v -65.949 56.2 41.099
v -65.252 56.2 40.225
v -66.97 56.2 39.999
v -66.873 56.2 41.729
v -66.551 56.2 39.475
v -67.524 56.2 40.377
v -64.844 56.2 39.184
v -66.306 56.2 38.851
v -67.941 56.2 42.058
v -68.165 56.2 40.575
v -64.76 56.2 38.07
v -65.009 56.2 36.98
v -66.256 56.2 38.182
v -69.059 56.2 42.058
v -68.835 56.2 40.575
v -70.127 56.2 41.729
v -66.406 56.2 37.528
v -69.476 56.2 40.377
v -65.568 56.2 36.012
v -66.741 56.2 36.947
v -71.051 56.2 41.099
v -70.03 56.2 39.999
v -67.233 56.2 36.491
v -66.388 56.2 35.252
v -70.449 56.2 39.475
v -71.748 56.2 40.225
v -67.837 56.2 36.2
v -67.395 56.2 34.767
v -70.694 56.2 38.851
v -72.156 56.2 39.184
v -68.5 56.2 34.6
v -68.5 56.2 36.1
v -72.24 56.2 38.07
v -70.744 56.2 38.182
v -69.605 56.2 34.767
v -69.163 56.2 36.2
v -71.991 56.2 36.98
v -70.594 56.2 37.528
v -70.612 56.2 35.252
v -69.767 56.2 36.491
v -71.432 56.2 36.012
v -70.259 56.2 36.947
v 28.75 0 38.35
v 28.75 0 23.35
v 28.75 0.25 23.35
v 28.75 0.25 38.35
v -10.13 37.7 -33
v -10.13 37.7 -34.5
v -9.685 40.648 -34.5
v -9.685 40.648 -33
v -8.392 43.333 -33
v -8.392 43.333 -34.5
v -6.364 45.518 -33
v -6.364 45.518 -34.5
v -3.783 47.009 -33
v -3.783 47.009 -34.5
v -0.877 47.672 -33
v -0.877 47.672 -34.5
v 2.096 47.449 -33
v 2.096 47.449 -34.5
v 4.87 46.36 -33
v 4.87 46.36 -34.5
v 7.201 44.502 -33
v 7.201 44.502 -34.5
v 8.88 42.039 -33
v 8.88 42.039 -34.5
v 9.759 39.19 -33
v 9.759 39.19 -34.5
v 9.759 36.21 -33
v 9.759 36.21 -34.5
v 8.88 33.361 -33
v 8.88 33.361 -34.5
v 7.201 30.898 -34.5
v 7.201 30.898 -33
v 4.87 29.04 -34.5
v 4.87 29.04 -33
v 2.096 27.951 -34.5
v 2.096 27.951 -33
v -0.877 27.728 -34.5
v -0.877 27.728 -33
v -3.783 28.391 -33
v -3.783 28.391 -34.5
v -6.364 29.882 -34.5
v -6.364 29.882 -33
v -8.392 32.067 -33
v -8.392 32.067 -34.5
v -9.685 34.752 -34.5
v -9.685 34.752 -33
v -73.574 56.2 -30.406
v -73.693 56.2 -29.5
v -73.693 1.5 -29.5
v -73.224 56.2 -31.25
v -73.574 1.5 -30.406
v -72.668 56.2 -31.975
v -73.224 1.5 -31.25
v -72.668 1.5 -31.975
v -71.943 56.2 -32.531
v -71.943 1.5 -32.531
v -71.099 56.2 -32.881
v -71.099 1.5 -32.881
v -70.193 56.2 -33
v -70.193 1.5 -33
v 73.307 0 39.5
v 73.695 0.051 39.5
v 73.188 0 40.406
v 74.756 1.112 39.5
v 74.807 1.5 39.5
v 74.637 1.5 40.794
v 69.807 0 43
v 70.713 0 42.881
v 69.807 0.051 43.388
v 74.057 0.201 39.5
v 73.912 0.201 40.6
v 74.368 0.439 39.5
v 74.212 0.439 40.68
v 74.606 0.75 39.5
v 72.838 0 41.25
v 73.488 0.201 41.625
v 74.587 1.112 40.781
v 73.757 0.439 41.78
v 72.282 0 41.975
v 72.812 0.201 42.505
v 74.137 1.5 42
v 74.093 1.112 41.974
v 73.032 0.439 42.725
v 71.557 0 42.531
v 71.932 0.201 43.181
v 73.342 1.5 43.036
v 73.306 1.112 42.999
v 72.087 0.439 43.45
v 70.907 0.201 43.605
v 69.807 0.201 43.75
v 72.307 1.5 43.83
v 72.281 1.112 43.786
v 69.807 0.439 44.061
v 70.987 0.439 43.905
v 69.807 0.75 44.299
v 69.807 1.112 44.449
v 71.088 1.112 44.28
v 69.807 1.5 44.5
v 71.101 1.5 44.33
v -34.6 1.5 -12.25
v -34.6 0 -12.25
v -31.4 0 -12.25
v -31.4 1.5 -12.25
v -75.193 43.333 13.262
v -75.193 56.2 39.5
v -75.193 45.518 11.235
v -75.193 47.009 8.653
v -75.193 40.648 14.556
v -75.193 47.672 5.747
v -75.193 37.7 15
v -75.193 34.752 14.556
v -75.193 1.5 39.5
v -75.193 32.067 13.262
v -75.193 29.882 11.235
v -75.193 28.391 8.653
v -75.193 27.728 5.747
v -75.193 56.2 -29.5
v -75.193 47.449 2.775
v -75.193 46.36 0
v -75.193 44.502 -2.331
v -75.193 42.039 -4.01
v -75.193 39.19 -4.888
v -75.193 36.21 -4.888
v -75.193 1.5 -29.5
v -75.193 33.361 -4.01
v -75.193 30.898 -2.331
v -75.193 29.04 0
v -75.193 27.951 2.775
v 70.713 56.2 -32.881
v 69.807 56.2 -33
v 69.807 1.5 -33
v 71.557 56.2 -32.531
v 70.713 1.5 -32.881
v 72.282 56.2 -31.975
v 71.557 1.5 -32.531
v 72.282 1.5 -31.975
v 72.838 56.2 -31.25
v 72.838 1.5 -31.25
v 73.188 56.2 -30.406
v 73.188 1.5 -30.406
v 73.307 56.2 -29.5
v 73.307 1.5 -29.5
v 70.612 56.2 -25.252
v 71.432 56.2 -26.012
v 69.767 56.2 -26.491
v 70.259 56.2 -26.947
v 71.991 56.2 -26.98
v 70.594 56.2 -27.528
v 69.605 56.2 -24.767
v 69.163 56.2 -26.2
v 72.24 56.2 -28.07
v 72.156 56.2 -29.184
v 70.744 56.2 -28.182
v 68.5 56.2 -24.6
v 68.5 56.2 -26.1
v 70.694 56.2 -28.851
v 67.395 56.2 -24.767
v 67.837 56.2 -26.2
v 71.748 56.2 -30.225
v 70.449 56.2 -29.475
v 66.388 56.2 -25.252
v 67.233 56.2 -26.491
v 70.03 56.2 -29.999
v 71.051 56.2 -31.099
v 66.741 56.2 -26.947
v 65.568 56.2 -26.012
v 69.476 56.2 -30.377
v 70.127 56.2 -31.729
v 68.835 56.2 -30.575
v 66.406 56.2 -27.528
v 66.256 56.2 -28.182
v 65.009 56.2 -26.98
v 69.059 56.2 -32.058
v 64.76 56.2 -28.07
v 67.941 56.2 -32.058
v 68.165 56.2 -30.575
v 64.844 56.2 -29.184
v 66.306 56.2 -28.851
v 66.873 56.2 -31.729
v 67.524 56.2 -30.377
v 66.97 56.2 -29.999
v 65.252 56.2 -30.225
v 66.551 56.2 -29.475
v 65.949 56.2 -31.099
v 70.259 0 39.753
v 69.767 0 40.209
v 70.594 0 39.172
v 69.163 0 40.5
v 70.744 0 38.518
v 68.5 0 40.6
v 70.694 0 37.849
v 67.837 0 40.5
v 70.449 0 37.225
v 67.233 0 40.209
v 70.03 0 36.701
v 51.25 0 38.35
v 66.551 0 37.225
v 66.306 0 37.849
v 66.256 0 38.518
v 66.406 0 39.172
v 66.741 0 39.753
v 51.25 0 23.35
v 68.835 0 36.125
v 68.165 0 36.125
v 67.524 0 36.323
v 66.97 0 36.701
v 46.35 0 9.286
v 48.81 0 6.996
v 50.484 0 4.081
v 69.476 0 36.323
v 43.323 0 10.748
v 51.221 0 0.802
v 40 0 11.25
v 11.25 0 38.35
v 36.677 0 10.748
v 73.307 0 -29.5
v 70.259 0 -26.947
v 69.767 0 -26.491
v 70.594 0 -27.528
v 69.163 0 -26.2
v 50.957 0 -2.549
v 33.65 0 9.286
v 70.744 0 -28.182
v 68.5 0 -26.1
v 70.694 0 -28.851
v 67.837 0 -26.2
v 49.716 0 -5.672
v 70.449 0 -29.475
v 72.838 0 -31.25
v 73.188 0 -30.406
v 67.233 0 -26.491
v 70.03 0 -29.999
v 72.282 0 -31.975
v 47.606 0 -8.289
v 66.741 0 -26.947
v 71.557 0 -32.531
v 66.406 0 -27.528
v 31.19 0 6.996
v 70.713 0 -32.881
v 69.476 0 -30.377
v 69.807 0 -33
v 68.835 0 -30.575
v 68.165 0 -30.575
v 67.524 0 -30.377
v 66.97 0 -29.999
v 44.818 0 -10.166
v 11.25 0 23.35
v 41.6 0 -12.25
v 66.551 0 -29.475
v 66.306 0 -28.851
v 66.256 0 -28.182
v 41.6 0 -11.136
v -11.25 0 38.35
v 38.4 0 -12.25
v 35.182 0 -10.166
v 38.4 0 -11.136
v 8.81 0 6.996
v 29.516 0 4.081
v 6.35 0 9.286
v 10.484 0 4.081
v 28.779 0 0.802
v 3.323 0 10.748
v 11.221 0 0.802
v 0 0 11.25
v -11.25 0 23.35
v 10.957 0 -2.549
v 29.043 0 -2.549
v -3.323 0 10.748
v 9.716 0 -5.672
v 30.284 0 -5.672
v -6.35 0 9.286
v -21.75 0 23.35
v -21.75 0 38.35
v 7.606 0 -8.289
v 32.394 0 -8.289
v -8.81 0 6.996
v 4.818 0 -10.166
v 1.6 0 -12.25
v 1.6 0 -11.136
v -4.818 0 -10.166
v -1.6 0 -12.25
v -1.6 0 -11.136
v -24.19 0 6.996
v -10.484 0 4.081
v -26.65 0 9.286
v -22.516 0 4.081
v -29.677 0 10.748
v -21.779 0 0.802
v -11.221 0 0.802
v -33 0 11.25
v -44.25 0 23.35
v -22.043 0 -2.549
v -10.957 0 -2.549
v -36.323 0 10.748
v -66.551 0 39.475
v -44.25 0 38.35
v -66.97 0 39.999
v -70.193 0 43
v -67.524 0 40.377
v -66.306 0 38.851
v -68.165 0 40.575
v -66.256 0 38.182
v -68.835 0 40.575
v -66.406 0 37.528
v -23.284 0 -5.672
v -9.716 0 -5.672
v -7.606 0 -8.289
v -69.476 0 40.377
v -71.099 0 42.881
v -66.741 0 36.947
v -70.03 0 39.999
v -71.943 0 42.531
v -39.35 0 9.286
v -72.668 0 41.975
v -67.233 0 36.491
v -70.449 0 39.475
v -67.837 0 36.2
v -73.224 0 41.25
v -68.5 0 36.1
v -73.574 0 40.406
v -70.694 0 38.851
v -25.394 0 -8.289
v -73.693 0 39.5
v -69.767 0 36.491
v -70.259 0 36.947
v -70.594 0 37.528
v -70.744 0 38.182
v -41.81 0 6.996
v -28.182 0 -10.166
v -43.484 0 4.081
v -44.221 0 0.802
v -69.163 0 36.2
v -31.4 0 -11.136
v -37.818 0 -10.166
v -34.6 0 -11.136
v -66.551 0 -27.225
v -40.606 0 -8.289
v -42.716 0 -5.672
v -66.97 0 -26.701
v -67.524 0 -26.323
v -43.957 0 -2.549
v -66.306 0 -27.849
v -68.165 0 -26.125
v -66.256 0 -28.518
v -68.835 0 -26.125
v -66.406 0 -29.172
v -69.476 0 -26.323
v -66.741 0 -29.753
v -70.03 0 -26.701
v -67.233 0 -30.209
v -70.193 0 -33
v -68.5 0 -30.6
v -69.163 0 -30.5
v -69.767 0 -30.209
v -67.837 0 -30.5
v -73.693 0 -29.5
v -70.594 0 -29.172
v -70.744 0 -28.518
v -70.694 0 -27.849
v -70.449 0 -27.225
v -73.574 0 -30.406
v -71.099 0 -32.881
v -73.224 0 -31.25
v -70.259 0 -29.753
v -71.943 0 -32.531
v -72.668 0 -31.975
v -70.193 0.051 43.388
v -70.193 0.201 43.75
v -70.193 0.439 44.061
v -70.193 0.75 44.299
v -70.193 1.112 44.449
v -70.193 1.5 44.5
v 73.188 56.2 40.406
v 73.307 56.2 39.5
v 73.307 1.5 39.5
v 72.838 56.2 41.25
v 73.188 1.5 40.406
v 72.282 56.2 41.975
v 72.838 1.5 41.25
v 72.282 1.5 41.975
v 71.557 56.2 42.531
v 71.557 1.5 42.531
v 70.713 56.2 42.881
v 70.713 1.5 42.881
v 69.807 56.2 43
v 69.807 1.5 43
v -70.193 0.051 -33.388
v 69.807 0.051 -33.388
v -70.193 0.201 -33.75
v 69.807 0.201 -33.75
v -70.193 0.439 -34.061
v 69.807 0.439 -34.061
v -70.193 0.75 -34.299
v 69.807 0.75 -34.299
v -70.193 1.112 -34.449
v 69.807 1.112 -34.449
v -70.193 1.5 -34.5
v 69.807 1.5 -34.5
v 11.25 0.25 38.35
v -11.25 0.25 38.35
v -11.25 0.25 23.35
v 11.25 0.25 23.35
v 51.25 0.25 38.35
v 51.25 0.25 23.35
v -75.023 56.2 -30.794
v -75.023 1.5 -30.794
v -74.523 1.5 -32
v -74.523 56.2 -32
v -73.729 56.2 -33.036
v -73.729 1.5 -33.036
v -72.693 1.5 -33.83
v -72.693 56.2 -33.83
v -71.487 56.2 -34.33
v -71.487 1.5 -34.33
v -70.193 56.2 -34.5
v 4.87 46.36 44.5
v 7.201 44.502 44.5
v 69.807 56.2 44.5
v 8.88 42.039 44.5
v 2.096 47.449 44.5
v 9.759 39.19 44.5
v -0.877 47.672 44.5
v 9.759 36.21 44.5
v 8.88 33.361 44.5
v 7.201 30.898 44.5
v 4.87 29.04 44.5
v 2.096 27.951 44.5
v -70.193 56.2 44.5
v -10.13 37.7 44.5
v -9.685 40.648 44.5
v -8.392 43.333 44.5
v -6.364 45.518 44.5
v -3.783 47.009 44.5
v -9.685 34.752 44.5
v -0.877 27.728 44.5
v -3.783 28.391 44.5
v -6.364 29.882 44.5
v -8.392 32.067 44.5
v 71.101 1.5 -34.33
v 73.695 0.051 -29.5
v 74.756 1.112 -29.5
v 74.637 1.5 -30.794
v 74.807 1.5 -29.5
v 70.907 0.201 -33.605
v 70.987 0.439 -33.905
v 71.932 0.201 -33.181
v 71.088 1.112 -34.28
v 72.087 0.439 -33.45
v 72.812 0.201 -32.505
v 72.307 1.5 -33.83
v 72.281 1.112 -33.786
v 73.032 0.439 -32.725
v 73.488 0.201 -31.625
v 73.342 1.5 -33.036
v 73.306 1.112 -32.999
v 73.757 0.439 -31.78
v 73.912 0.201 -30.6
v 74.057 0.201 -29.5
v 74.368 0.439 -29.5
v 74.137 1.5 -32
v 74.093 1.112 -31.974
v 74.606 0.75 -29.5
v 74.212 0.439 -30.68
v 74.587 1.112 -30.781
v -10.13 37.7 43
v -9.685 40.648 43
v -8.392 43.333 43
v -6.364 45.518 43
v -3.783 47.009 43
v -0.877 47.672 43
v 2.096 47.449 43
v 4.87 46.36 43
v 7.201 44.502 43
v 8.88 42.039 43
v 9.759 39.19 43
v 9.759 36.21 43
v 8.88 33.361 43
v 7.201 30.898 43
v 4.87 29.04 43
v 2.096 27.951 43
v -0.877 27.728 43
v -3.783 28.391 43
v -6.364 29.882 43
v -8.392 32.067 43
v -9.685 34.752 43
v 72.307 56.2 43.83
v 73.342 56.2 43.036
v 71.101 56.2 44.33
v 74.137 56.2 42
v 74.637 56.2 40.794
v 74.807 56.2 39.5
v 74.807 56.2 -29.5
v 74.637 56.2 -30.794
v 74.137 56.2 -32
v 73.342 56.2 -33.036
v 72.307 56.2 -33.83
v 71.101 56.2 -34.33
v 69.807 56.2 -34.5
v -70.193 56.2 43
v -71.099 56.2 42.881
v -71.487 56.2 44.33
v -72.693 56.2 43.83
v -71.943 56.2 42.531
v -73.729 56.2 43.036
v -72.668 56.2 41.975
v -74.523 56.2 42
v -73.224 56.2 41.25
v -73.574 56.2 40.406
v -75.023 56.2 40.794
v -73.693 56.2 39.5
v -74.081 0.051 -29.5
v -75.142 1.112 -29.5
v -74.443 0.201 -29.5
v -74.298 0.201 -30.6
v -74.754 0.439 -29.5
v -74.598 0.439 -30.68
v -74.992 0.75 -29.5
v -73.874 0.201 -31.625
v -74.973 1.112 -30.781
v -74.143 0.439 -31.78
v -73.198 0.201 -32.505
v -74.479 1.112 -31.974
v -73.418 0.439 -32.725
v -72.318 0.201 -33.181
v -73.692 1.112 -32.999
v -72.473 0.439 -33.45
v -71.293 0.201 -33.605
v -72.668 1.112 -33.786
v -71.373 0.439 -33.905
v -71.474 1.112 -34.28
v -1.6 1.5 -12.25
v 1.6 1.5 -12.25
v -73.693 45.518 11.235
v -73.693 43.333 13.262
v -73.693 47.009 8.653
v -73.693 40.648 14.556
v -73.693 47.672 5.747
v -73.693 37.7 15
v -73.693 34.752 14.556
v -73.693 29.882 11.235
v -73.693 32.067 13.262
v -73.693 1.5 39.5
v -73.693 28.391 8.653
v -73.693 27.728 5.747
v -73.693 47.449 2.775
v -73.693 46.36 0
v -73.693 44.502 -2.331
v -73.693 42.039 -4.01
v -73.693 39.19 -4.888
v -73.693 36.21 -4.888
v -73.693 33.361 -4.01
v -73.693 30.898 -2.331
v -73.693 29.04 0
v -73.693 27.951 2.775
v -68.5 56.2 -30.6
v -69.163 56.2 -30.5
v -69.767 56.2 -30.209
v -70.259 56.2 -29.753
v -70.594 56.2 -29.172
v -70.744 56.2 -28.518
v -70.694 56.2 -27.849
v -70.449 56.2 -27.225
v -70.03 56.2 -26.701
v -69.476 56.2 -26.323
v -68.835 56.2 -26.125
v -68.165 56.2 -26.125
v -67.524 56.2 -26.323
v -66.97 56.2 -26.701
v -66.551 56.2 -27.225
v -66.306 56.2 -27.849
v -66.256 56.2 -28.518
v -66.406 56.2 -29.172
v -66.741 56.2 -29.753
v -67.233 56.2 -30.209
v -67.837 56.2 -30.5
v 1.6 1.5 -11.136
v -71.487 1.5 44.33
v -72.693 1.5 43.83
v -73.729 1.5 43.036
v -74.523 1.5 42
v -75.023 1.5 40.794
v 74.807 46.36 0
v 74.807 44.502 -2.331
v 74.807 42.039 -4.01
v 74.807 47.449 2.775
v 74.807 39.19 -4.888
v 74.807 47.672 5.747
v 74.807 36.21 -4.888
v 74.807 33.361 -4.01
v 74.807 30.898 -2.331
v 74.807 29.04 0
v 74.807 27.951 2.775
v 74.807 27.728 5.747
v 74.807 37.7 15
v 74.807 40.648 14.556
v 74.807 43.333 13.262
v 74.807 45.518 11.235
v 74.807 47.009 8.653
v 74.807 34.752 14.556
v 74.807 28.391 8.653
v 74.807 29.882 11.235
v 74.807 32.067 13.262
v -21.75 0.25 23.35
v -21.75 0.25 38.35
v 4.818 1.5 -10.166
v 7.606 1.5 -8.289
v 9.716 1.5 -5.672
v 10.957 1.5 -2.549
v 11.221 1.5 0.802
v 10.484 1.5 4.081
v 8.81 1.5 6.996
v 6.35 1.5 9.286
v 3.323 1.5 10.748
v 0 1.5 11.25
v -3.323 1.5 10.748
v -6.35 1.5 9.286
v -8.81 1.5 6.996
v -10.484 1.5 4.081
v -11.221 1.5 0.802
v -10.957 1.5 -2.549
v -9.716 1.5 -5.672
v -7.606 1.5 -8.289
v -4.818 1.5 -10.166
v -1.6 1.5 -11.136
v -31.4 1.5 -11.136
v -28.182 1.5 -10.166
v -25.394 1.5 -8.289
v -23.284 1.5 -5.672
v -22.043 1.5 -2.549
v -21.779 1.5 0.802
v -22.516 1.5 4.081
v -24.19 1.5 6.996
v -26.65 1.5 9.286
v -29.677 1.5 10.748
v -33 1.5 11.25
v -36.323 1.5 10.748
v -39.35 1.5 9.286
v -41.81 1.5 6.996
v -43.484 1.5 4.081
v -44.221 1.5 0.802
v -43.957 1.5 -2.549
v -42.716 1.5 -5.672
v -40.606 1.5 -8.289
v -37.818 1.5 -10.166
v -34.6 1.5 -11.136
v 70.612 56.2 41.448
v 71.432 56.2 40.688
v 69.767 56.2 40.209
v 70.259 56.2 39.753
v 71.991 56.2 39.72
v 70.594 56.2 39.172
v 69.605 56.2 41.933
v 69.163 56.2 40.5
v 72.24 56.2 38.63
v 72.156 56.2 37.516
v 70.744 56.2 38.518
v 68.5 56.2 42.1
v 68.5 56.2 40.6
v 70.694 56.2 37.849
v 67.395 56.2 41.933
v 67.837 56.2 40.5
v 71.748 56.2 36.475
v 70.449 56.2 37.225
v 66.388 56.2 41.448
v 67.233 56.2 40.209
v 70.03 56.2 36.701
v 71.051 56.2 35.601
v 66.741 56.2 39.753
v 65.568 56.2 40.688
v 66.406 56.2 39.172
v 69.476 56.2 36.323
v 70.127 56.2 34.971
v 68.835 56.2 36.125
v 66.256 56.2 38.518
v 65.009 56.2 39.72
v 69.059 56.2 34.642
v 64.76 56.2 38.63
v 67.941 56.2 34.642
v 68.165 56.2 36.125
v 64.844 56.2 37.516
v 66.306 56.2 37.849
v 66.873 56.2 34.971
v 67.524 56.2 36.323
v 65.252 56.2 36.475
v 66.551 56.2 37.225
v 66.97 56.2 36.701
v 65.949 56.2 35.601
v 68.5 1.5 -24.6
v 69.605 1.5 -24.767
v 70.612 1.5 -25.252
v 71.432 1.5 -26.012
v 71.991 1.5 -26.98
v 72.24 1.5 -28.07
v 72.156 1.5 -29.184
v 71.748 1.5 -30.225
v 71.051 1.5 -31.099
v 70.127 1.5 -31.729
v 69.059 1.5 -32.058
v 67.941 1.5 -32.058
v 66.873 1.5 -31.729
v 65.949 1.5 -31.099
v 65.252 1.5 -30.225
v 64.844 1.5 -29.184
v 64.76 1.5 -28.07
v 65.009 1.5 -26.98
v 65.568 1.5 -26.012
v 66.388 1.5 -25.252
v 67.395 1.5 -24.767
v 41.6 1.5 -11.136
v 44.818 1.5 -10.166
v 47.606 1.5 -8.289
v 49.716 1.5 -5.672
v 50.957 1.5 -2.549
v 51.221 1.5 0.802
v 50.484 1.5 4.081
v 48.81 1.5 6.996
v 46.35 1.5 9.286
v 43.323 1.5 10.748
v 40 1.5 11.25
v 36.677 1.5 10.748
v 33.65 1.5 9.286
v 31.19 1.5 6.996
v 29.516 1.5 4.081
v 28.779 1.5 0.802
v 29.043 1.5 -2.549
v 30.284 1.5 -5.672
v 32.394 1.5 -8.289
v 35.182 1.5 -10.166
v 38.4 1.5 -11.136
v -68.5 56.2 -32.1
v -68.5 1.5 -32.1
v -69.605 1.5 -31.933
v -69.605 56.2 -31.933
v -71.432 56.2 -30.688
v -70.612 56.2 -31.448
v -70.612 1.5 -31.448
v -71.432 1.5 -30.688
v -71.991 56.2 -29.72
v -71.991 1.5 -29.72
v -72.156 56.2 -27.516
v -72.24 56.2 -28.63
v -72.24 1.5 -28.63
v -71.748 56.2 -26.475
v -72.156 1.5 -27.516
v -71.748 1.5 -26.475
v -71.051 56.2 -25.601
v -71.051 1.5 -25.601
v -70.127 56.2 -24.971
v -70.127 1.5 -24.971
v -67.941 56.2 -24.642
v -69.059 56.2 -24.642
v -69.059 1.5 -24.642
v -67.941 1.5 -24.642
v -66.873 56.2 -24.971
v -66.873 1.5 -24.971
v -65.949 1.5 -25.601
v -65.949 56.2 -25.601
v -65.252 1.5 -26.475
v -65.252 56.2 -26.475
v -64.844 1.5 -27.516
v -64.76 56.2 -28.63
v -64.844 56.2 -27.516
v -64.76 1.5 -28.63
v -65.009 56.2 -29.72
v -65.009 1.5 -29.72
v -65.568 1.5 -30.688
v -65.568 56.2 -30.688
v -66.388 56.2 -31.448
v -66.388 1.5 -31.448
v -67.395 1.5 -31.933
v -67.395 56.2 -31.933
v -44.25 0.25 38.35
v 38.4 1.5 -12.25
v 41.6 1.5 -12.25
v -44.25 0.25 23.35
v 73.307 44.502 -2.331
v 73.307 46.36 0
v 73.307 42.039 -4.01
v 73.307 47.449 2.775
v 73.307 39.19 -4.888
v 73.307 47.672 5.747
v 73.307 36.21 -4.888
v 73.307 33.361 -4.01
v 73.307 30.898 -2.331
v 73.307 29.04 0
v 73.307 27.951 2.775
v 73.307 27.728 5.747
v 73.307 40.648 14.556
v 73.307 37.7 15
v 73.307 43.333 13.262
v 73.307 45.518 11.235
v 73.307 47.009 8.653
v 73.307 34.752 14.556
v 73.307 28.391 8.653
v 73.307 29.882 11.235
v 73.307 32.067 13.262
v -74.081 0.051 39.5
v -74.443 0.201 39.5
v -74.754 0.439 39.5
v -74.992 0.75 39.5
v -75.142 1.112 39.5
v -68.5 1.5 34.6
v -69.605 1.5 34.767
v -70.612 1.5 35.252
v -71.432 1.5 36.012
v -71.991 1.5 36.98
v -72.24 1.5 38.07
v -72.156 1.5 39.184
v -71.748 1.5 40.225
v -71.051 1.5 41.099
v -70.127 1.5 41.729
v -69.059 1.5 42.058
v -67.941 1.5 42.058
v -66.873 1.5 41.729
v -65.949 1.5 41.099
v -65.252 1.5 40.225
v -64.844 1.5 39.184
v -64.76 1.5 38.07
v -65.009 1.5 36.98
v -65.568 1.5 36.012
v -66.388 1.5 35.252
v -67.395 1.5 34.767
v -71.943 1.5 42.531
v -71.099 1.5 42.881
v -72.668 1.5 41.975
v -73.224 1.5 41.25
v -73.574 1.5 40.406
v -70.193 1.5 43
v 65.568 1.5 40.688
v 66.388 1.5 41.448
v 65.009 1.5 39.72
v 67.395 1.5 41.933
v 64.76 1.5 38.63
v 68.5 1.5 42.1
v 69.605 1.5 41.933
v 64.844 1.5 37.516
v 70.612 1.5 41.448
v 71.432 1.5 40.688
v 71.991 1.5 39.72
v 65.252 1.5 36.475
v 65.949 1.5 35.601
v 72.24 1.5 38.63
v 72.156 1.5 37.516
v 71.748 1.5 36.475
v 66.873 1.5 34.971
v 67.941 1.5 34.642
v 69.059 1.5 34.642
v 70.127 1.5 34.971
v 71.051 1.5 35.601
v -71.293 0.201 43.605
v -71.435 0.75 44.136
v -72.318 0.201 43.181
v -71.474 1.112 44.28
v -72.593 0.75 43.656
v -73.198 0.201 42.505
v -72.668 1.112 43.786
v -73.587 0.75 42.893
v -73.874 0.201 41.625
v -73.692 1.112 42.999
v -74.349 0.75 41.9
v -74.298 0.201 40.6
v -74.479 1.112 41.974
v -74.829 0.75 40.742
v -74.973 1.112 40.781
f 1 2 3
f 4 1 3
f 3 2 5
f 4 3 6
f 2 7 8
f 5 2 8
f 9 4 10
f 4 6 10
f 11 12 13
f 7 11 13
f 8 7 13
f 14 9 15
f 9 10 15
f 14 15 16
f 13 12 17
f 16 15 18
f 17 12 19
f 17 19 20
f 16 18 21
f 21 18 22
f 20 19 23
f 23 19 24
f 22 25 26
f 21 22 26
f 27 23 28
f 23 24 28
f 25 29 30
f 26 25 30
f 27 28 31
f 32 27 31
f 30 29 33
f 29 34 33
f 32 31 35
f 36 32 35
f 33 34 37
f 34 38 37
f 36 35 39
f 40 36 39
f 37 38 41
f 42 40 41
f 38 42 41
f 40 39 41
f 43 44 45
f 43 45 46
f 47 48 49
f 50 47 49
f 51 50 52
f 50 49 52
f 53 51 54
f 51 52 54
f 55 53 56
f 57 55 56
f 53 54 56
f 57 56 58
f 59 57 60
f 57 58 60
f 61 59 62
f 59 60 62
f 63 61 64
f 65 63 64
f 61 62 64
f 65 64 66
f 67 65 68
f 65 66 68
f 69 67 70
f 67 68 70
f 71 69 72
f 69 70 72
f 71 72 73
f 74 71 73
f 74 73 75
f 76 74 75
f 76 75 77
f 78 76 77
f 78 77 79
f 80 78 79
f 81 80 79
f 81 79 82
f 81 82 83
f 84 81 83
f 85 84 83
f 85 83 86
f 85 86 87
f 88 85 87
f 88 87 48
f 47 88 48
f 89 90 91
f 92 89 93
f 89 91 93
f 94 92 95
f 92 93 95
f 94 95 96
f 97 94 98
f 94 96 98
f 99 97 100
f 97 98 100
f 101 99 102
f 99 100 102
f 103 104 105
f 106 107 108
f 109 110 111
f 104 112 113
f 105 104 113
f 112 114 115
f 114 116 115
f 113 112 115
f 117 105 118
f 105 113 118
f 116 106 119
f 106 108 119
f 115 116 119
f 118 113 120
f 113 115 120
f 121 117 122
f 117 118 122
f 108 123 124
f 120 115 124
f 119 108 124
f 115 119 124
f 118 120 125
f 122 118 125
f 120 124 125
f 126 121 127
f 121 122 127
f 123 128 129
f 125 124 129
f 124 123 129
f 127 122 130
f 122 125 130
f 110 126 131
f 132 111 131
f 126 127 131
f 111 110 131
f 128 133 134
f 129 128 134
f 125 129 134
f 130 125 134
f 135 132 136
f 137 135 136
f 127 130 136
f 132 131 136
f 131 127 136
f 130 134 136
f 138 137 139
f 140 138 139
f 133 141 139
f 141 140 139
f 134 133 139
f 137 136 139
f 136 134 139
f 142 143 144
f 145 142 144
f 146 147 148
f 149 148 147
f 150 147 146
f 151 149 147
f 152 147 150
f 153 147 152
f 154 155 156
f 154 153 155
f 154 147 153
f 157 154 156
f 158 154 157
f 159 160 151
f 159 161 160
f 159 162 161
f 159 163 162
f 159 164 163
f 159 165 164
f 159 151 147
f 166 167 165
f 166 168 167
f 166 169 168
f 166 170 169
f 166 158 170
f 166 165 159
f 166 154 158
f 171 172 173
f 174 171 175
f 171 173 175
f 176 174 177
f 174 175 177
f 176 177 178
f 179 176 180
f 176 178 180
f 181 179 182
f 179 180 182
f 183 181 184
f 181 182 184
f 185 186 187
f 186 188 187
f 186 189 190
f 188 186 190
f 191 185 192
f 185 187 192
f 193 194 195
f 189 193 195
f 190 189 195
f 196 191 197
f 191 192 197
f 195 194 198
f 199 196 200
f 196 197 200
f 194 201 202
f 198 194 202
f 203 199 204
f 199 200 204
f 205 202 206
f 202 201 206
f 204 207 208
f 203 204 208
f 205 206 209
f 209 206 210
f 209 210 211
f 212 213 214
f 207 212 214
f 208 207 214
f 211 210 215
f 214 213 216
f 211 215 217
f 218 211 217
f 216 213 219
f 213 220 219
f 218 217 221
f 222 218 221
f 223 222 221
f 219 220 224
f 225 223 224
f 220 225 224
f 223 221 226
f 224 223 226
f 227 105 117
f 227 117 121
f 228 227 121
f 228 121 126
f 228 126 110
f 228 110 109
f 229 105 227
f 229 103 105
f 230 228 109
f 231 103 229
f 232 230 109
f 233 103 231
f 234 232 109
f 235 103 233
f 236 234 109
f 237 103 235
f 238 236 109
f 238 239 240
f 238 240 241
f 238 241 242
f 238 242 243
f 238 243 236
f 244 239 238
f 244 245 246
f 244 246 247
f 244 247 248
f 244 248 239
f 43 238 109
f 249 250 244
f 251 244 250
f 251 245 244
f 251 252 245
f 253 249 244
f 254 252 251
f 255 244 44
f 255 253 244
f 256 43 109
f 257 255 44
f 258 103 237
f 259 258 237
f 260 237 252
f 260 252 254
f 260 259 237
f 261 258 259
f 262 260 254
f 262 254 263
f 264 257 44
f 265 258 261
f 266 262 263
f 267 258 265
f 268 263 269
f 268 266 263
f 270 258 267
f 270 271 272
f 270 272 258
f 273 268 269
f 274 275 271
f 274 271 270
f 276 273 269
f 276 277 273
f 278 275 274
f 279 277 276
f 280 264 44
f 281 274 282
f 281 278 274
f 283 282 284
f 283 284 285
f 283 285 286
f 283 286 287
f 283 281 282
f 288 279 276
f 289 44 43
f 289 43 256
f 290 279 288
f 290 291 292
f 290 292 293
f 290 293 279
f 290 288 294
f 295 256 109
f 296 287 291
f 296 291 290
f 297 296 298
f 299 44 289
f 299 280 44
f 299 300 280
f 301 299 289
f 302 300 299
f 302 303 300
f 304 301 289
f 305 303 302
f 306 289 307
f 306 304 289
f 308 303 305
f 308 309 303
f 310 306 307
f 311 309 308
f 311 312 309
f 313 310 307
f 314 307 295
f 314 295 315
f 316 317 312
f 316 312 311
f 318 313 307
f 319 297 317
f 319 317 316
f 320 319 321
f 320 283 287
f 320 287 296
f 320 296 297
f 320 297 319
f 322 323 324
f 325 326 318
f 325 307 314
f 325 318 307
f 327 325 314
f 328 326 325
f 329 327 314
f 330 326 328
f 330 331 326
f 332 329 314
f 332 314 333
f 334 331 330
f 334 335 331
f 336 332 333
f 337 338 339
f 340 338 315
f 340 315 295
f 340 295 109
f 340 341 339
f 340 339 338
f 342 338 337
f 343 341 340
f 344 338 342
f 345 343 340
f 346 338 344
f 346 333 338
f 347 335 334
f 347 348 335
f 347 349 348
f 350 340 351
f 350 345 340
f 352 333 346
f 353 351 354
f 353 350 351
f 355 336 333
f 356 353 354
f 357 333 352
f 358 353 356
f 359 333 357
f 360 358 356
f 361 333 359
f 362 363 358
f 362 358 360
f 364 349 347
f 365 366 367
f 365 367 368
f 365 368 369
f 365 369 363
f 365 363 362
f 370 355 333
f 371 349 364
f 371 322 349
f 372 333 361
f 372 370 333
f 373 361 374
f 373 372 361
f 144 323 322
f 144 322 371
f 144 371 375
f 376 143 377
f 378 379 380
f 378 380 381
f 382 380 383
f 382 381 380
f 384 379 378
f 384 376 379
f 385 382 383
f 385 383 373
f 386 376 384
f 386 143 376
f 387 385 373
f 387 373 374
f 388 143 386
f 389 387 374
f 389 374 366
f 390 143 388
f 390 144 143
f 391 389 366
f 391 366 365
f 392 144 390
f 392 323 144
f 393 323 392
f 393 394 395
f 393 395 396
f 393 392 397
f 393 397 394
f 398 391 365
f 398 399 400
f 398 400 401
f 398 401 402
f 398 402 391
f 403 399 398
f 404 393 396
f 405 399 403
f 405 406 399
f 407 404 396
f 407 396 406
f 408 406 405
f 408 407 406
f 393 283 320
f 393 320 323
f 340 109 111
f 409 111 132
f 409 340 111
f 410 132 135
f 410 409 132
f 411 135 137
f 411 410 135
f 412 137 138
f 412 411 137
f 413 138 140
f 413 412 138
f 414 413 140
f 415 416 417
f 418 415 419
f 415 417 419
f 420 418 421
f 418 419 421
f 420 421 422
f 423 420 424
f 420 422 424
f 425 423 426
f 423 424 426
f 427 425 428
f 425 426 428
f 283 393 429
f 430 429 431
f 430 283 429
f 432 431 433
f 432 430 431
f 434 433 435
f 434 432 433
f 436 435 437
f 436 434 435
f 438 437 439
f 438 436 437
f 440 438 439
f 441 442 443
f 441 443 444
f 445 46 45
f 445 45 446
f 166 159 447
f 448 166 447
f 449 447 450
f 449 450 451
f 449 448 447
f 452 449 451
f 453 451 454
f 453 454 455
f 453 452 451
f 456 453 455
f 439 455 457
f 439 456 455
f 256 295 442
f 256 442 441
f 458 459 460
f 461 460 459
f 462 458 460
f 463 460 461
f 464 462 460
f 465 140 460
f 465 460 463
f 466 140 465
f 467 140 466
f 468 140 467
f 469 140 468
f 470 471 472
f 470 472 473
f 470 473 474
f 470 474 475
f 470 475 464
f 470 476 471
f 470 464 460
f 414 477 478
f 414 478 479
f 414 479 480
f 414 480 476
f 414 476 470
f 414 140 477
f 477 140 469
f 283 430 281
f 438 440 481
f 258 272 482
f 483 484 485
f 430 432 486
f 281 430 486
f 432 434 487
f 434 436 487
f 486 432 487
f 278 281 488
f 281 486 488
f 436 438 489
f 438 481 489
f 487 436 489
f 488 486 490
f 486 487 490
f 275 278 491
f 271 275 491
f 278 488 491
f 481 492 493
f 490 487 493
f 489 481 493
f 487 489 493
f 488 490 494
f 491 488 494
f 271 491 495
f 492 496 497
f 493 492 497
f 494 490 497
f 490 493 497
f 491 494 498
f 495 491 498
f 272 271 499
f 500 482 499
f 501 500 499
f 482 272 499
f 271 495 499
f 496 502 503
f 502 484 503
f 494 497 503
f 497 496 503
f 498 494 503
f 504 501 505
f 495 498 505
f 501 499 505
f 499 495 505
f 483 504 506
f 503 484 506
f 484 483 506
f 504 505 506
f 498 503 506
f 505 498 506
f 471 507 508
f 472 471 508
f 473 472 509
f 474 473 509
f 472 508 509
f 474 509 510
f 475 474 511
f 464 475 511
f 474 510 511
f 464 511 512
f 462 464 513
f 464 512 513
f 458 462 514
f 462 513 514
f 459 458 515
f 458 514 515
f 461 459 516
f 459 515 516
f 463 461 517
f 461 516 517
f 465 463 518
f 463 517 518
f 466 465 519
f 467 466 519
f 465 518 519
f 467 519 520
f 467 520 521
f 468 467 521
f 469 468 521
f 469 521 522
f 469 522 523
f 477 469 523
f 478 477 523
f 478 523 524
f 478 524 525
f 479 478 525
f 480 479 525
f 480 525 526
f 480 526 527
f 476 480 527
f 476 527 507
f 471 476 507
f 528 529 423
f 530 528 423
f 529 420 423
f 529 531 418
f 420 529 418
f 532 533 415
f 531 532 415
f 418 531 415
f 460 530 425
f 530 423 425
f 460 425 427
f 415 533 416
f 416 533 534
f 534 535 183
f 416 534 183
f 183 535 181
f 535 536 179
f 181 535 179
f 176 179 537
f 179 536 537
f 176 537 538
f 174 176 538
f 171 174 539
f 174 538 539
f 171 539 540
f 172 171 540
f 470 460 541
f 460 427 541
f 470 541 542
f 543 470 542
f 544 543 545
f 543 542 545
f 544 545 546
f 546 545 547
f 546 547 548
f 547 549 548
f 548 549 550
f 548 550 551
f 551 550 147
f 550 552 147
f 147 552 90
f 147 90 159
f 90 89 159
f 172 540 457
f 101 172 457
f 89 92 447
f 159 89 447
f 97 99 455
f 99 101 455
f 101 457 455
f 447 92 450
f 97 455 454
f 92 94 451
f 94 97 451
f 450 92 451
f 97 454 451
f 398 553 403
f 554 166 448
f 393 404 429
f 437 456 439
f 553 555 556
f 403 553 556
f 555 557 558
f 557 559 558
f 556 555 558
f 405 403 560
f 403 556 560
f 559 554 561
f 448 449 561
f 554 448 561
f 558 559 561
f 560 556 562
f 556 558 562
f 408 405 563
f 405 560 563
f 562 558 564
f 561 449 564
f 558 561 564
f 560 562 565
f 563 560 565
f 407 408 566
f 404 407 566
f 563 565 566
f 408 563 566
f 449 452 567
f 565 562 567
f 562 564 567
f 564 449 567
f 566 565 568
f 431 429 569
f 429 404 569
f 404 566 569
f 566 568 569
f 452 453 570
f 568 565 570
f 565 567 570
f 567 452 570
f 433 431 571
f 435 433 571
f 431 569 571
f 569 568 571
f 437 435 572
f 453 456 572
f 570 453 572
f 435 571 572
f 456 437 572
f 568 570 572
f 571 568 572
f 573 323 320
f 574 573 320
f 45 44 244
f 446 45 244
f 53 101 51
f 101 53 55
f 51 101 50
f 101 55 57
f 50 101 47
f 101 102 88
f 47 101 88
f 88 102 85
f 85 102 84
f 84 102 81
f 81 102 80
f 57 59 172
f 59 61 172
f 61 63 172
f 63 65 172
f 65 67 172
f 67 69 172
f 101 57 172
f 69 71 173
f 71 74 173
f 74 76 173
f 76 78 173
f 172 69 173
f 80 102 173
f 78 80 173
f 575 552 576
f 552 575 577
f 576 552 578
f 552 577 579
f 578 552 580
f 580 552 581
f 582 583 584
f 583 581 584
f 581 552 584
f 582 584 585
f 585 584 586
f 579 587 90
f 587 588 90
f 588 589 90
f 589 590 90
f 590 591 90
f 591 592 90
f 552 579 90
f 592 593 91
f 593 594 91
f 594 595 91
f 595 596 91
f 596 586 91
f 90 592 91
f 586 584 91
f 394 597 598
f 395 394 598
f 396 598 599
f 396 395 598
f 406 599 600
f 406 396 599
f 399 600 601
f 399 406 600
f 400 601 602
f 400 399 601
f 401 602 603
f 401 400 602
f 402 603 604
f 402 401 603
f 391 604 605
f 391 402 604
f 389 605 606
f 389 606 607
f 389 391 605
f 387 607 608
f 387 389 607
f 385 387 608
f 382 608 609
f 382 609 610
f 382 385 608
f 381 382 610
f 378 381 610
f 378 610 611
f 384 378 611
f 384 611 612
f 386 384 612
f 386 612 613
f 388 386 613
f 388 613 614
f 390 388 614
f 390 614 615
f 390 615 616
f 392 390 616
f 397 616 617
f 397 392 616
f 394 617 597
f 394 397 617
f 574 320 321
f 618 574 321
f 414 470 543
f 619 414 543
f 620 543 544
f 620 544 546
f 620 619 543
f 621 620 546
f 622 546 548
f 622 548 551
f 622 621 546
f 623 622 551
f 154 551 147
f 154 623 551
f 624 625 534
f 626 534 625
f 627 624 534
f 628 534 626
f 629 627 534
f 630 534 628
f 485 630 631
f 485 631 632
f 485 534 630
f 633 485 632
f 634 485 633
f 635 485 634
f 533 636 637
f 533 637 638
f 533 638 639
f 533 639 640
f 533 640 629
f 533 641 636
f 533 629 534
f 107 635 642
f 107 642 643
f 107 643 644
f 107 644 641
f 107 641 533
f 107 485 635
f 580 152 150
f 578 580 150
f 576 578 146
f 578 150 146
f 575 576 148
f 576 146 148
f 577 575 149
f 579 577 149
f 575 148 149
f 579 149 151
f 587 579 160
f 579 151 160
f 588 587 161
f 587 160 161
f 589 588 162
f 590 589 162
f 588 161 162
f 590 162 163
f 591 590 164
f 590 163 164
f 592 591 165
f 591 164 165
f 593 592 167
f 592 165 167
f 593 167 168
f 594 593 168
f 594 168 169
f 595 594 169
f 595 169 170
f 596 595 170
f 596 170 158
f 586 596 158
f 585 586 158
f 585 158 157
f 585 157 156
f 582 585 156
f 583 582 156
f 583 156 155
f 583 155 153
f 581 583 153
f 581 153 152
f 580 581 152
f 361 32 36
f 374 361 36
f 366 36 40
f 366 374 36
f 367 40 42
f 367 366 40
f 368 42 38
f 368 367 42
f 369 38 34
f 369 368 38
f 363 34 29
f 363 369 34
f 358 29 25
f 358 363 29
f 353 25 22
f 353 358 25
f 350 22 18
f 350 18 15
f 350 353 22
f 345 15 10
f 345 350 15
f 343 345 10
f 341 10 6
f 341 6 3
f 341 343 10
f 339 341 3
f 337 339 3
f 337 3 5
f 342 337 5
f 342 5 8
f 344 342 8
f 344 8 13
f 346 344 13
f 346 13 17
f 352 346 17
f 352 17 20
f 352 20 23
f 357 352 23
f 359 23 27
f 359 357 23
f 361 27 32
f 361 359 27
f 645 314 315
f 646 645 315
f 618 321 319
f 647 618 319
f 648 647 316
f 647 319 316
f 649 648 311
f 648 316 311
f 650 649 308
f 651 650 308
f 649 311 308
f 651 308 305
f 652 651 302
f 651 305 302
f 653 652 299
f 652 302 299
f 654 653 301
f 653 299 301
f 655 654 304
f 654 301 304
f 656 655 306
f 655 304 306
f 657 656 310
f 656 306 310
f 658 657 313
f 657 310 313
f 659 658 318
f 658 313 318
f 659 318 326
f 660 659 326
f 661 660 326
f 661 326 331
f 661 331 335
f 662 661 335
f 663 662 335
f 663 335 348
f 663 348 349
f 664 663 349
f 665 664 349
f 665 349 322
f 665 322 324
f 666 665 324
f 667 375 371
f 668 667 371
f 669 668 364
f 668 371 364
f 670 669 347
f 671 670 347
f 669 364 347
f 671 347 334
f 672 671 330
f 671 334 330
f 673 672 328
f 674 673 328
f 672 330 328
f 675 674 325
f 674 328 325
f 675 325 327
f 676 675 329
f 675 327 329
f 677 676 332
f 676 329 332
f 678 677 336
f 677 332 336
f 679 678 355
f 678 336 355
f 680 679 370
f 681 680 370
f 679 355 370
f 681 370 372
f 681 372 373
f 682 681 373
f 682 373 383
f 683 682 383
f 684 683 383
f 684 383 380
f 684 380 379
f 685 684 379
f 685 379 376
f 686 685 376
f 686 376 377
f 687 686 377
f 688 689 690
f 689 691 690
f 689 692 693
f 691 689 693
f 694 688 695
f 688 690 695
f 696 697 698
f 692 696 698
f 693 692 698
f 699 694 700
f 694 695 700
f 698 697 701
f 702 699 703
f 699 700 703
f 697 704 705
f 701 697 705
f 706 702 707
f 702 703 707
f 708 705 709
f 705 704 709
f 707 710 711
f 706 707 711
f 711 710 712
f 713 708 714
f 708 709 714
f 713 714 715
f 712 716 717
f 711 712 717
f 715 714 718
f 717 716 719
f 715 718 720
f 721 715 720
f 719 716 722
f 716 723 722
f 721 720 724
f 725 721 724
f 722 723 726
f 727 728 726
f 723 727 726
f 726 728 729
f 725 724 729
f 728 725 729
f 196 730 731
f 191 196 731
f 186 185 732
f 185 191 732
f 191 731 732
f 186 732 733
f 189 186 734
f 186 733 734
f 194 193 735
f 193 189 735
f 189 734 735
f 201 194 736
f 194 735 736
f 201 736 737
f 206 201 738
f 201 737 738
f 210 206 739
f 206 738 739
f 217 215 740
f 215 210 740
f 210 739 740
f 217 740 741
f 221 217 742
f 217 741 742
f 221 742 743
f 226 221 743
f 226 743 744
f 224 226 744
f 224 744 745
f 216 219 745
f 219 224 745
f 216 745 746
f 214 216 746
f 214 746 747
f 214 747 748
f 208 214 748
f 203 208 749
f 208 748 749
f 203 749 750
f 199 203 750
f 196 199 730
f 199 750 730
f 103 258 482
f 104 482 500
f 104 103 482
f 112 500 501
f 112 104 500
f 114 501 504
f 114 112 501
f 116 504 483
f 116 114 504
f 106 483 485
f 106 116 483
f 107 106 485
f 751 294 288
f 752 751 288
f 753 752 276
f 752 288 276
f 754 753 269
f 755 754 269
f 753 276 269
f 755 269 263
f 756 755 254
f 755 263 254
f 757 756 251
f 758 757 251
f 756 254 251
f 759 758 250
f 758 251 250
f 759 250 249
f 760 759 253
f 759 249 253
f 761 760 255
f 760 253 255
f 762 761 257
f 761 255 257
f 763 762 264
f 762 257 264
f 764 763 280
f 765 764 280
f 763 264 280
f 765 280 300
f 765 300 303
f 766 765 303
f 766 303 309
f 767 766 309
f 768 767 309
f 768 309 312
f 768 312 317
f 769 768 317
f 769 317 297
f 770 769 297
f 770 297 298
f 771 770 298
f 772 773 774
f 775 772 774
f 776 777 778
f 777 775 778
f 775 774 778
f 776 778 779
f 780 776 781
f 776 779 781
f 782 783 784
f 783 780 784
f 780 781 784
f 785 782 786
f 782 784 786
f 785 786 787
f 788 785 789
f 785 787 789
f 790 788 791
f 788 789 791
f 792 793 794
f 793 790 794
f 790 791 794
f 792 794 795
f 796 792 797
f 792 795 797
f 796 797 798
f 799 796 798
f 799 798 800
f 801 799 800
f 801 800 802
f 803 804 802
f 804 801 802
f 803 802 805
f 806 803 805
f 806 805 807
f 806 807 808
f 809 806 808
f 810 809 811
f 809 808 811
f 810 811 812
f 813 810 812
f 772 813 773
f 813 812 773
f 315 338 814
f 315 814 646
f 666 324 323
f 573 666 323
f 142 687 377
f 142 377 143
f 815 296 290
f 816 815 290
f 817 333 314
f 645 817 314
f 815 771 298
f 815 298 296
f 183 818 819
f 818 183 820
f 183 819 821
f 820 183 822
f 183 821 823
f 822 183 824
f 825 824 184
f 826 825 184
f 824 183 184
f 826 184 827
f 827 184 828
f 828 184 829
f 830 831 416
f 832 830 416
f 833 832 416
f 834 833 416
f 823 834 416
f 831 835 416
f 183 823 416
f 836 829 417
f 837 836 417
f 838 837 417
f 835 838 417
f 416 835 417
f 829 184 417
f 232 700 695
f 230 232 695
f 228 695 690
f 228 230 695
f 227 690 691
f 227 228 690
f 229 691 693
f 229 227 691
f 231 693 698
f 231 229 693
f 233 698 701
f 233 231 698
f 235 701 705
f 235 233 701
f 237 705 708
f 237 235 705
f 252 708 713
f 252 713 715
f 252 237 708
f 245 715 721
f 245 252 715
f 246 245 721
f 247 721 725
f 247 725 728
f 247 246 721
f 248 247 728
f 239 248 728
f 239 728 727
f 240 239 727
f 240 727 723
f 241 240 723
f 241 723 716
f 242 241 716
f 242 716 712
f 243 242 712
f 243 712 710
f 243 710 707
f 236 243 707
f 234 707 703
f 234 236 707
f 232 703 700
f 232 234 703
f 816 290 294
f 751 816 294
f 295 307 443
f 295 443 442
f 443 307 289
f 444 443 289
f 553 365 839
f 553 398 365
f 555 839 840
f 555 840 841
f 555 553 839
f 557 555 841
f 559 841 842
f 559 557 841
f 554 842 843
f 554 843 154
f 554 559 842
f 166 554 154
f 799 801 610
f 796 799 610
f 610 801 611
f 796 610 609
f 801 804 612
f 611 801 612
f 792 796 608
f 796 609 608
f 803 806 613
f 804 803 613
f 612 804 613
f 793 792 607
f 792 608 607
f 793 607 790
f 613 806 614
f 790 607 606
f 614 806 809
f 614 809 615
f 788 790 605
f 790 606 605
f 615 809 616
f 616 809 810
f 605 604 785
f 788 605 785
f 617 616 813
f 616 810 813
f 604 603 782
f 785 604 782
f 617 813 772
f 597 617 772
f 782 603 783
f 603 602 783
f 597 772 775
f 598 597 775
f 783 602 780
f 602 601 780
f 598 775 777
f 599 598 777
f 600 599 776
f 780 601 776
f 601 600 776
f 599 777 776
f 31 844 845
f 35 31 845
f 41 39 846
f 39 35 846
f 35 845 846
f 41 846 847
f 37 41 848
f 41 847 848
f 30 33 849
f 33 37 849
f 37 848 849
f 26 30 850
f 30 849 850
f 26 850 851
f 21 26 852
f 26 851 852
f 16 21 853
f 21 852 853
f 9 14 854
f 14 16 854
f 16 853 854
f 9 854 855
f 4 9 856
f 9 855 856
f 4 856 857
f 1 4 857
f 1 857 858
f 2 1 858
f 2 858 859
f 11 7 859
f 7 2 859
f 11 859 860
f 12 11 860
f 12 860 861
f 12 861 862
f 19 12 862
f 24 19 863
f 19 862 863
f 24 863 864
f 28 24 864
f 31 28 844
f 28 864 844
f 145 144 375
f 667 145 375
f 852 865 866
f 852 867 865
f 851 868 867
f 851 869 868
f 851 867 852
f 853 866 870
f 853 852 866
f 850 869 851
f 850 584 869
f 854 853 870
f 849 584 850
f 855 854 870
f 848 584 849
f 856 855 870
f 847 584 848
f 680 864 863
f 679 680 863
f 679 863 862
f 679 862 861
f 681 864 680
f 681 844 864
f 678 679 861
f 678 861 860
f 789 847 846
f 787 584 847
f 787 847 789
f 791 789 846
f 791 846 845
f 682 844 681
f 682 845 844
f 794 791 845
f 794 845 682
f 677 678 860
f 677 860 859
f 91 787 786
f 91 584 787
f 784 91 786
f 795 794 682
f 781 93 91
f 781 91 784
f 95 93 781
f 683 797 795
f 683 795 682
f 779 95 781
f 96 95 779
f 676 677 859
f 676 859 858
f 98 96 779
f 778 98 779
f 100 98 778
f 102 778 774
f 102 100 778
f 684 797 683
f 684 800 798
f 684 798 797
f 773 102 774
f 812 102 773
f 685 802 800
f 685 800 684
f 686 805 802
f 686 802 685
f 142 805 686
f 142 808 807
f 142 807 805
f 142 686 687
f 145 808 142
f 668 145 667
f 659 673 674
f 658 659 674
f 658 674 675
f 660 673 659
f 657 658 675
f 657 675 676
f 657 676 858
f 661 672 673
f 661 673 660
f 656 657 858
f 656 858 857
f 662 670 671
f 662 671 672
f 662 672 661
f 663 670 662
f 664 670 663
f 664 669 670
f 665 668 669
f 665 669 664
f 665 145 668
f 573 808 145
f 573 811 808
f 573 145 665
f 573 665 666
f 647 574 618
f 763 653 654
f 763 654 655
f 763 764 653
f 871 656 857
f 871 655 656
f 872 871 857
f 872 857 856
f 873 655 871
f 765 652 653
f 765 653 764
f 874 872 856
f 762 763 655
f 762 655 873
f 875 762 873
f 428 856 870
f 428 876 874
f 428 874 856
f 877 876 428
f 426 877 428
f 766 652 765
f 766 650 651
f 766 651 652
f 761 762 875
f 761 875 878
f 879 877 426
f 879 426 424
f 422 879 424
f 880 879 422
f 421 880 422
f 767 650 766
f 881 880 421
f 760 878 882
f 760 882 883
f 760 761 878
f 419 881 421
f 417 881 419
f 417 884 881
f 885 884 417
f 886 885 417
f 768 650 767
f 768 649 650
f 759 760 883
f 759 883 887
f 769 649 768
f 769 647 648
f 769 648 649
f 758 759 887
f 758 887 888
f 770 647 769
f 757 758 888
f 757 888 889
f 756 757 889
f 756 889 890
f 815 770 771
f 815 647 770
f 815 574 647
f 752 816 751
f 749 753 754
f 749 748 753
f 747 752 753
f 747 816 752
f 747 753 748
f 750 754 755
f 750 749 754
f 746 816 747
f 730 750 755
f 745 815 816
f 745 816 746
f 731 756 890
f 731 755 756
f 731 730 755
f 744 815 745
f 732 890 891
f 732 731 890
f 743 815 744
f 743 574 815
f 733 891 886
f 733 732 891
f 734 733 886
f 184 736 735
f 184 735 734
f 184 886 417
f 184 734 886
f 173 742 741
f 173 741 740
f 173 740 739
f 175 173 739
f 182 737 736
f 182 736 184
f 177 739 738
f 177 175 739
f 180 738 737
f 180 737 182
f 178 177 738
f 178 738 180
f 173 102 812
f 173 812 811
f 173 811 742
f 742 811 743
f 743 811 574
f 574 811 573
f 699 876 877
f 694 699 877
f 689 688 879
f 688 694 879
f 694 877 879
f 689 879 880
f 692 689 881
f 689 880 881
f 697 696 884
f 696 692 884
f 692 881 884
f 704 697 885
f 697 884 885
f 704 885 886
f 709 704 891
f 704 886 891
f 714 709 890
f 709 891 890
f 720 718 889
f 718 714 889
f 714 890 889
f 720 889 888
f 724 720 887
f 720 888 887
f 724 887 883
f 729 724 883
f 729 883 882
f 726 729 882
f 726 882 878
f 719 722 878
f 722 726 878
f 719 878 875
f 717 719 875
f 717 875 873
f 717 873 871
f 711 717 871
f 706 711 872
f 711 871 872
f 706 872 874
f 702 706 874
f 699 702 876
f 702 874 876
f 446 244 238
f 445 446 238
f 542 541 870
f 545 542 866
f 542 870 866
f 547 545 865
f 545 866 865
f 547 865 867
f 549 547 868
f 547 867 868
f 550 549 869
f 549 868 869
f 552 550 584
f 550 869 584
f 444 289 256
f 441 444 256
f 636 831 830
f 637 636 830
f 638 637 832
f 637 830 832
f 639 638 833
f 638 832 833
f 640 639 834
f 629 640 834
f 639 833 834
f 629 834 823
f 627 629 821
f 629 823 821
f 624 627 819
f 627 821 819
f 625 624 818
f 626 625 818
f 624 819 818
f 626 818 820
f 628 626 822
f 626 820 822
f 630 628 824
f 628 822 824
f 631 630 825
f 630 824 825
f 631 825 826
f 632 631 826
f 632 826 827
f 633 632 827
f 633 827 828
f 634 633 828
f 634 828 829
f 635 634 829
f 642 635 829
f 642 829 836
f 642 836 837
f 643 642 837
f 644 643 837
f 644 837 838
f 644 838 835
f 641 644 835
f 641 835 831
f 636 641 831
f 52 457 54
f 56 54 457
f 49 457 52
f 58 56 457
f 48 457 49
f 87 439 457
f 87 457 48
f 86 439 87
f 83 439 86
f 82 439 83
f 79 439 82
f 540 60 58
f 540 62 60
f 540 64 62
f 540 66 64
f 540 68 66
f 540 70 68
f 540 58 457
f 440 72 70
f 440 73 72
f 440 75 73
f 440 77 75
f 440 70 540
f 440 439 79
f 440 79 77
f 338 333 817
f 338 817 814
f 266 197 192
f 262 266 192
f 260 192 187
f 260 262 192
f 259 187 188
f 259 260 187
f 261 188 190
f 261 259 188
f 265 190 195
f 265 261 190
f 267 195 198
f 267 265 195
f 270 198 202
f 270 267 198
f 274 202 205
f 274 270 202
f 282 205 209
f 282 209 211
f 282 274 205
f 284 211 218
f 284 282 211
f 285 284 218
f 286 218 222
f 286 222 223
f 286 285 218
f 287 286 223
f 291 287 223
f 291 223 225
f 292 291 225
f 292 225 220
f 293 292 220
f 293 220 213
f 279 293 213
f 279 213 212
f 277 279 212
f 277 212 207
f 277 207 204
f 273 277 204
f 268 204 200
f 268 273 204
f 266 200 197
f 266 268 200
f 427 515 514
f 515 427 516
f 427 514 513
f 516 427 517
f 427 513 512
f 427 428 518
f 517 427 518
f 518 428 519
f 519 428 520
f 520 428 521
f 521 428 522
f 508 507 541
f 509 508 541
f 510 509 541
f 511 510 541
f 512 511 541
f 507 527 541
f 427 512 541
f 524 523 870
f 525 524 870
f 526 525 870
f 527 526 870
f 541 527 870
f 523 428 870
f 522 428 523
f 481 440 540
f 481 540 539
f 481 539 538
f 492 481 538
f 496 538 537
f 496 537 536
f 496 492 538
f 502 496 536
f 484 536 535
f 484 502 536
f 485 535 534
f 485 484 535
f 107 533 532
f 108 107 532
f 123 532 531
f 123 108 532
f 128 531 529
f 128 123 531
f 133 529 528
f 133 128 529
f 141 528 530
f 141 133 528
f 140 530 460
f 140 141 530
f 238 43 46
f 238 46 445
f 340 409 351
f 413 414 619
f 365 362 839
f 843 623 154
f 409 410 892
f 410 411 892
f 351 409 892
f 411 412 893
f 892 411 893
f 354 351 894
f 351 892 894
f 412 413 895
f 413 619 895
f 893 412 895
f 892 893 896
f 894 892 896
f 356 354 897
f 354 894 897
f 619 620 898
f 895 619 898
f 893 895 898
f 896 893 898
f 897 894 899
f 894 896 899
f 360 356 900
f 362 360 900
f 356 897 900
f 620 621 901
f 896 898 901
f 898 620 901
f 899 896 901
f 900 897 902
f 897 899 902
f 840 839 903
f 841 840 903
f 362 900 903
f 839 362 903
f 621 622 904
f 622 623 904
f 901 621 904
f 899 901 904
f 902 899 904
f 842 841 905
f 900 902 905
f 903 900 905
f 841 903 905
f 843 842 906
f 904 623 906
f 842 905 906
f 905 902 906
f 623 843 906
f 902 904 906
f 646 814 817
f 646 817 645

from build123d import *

# Parameters (mm, degrees)
SKETCH1_R           = 2.25
BOSS_EXTRUDE1_DEPTH = 56.2
SHELL1_T            = -1.5
SKETCH2_W           = 107.526504688
SKETCH2_H           = 43.658783516
CUT_EXTRUDE1_DEPTH  = 54.7
FILLET1_R           = 1.5
SKETCH3_R           = 10
CUT_EXTRUDE2_DEPTH  = 123.692467131
SKETCH4_R           = 10
CUT_EXTRUDE3_DEPTH  = 167.248879786
SKETCH6_W           = 22.5
SKETCH6_H           = 15
CUT_EXTRUDE5_DEPTH  = 0.25


with BuildPart() as part:
    # Sketch1 → Boss-Extrude1 (new body)
    with BuildSketch(Plane(origin=(0, 0, 0), x_dir=(1, 0, 0), z_dir=(0, 1, 0))):
        with BuildLine():
            Line((-70.193094701, 34.5), (69.806905299, 34.5))
            ThreePointArc((69.806905299, 34.5), (73.342439205, 33.035533906), (74.806905299, 29.5))
            Line((74.806905299, 29.5), (74.806905299, -39.5))
            ThreePointArc((74.806905299, -39.5), (73.342439205, -43.035533906), (69.806905299, -44.5))
            Line((69.806905299, -44.5), (-70.193094701, -44.5))
            ThreePointArc((-70.193094701, -44.5), (-73.728628607, -43.035533906), (-75.193094701, -39.5))
            Line((-75.193094701, -39.5), (-75.193094701, 29.5))
            ThreePointArc((-75.193094701, 29.5), (-73.728628607, 33.035533906), (-70.193094701, 34.5))
        make_face()
        with Locations(Location((68.5, 28.35, 0), (0, 0, 270))):
            Circle(SKETCH1_R, mode=Mode.SUBTRACT)
        with Locations(Location((68.5, -38.35, 0), (0, 0, 270))):
            Circle(SKETCH1_R, mode=Mode.SUBTRACT)
        with Locations(Location((-68.5, -38.35, 0), (0, 0, 90))):
            Circle(SKETCH1_R, mode=Mode.SUBTRACT)
        with Locations(Location((-68.5, 28.35, 0), (0, 0, 90))):
            Circle(SKETCH1_R, mode=Mode.SUBTRACT)
        with BuildLine():
            Line((-34.6, 11.135640978), (-34.6, 12.25))
            Line((-34.6, 12.25), (-31.4, 12.25))
            Line((-31.4, 12.25), (-31.4, 11.135640978))
            ThreePointArc((-31.4, 11.135640978), (-33, -11.25), (-34.6, 11.135640978))
        make_face(mode=Mode.SUBTRACT)
        with BuildLine():
            Line((-1.6, 11.135640978), (-1.6, 12.25))
            Line((-1.6, 12.25), (1.6, 12.25))
            Line((1.6, 12.25), (1.6, 11.135640978))
            ThreePointArc((1.6, 11.135640978), (0, -11.25), (-1.6, 11.135640978))
        make_face(mode=Mode.SUBTRACT)
        with BuildLine():
            Line((38.4, 11.135640978), (38.4, 12.25))
            Line((38.4, 12.25), (41.6, 12.25))
            Line((41.6, 12.25), (41.6, 11.135640978))
            ThreePointArc((41.6, 11.135640978), (40, -11.25), (38.4, 11.135640978))
        make_face(mode=Mode.SUBTRACT)
    extrude(amount=BOSS_EXTRUDE1_DEPTH)

    # Shell1
    shell1_openings = [part.faces().sort_by_distance(p)[0] for p in [
        (-0.193094701, 56.2, -32.804682921),
    ]]
    offset(amount=SHELL1_T, openings=shell1_openings, kind=Kind.INTERSECTION)

    # Sketch2 → Cut-Extrude1 (cut)
    with BuildSketch(Plane(origin=(0, 56.2, 0), x_dir=(1, 0, 0), z_dir=(0, 1, 0))):
        Rectangle(SKETCH2_W, SKETCH2_H)
    extrude(amount=-CUT_EXTRUDE1_DEPTH, mode=Mode.SUBTRACT)

    # Fillet1
    fillet1_edges = [part.edges().sort_by_distance(p)[0] for p in [
        (-75.193094701, 0, 5),
        (-73.728628607, 0, -33.035533906),
        (-0.193094701, 0, -34.5),
        (73.342439205, 0, -33.035533906),
        (74.806905299, 0, 5),
        (73.342439205, 0, 43.035533906),
        (-0.193094701, 0, 44.5),
        (-73.728628607, 0, 43.035533906),
    ]]
    fillet(fillet1_edges, radius=FILLET1_R)

    # Sketch3 → Cut-Extrude2 (cut, through all)
    with BuildSketch(Plane(origin=(0, 0, -34.5), x_dir=(-1, 0, 0), z_dir=(0, 0, -1))):
        with Locations((0.129531499, 37.7)):
            Circle(SKETCH3_R)
    extrude(amount=-CUT_EXTRUDE2_DEPTH, mode=Mode.SUBTRACT)

    # Sketch4 → Cut-Extrude3 (cut, through all)
    with BuildSketch(Plane.ZY.offset(75.193094701)):
        with Locations((5, 37.7)):
            Circle(SKETCH4_R)
    extrude(amount=-CUT_EXTRUDE3_DEPTH, mode=Mode.SUBTRACT)

    # Sketch6 → Cut-Extrude5 (cut)
    with BuildSketch(Plane.XZ):
        with Locations((-33, 30.85)):
            Rectangle(SKETCH6_W, SKETCH6_H)
        with Locations((40, 30.85)):
            Rectangle(SKETCH6_W, SKETCH6_H)
        with Locations((0, 30.85)):
            Rectangle(SKETCH6_W, SKETCH6_H)
    extrude(amount=-CUT_EXTRUDE5_DEPTH, mode=Mode.SUBTRACT)


solid = part.part
